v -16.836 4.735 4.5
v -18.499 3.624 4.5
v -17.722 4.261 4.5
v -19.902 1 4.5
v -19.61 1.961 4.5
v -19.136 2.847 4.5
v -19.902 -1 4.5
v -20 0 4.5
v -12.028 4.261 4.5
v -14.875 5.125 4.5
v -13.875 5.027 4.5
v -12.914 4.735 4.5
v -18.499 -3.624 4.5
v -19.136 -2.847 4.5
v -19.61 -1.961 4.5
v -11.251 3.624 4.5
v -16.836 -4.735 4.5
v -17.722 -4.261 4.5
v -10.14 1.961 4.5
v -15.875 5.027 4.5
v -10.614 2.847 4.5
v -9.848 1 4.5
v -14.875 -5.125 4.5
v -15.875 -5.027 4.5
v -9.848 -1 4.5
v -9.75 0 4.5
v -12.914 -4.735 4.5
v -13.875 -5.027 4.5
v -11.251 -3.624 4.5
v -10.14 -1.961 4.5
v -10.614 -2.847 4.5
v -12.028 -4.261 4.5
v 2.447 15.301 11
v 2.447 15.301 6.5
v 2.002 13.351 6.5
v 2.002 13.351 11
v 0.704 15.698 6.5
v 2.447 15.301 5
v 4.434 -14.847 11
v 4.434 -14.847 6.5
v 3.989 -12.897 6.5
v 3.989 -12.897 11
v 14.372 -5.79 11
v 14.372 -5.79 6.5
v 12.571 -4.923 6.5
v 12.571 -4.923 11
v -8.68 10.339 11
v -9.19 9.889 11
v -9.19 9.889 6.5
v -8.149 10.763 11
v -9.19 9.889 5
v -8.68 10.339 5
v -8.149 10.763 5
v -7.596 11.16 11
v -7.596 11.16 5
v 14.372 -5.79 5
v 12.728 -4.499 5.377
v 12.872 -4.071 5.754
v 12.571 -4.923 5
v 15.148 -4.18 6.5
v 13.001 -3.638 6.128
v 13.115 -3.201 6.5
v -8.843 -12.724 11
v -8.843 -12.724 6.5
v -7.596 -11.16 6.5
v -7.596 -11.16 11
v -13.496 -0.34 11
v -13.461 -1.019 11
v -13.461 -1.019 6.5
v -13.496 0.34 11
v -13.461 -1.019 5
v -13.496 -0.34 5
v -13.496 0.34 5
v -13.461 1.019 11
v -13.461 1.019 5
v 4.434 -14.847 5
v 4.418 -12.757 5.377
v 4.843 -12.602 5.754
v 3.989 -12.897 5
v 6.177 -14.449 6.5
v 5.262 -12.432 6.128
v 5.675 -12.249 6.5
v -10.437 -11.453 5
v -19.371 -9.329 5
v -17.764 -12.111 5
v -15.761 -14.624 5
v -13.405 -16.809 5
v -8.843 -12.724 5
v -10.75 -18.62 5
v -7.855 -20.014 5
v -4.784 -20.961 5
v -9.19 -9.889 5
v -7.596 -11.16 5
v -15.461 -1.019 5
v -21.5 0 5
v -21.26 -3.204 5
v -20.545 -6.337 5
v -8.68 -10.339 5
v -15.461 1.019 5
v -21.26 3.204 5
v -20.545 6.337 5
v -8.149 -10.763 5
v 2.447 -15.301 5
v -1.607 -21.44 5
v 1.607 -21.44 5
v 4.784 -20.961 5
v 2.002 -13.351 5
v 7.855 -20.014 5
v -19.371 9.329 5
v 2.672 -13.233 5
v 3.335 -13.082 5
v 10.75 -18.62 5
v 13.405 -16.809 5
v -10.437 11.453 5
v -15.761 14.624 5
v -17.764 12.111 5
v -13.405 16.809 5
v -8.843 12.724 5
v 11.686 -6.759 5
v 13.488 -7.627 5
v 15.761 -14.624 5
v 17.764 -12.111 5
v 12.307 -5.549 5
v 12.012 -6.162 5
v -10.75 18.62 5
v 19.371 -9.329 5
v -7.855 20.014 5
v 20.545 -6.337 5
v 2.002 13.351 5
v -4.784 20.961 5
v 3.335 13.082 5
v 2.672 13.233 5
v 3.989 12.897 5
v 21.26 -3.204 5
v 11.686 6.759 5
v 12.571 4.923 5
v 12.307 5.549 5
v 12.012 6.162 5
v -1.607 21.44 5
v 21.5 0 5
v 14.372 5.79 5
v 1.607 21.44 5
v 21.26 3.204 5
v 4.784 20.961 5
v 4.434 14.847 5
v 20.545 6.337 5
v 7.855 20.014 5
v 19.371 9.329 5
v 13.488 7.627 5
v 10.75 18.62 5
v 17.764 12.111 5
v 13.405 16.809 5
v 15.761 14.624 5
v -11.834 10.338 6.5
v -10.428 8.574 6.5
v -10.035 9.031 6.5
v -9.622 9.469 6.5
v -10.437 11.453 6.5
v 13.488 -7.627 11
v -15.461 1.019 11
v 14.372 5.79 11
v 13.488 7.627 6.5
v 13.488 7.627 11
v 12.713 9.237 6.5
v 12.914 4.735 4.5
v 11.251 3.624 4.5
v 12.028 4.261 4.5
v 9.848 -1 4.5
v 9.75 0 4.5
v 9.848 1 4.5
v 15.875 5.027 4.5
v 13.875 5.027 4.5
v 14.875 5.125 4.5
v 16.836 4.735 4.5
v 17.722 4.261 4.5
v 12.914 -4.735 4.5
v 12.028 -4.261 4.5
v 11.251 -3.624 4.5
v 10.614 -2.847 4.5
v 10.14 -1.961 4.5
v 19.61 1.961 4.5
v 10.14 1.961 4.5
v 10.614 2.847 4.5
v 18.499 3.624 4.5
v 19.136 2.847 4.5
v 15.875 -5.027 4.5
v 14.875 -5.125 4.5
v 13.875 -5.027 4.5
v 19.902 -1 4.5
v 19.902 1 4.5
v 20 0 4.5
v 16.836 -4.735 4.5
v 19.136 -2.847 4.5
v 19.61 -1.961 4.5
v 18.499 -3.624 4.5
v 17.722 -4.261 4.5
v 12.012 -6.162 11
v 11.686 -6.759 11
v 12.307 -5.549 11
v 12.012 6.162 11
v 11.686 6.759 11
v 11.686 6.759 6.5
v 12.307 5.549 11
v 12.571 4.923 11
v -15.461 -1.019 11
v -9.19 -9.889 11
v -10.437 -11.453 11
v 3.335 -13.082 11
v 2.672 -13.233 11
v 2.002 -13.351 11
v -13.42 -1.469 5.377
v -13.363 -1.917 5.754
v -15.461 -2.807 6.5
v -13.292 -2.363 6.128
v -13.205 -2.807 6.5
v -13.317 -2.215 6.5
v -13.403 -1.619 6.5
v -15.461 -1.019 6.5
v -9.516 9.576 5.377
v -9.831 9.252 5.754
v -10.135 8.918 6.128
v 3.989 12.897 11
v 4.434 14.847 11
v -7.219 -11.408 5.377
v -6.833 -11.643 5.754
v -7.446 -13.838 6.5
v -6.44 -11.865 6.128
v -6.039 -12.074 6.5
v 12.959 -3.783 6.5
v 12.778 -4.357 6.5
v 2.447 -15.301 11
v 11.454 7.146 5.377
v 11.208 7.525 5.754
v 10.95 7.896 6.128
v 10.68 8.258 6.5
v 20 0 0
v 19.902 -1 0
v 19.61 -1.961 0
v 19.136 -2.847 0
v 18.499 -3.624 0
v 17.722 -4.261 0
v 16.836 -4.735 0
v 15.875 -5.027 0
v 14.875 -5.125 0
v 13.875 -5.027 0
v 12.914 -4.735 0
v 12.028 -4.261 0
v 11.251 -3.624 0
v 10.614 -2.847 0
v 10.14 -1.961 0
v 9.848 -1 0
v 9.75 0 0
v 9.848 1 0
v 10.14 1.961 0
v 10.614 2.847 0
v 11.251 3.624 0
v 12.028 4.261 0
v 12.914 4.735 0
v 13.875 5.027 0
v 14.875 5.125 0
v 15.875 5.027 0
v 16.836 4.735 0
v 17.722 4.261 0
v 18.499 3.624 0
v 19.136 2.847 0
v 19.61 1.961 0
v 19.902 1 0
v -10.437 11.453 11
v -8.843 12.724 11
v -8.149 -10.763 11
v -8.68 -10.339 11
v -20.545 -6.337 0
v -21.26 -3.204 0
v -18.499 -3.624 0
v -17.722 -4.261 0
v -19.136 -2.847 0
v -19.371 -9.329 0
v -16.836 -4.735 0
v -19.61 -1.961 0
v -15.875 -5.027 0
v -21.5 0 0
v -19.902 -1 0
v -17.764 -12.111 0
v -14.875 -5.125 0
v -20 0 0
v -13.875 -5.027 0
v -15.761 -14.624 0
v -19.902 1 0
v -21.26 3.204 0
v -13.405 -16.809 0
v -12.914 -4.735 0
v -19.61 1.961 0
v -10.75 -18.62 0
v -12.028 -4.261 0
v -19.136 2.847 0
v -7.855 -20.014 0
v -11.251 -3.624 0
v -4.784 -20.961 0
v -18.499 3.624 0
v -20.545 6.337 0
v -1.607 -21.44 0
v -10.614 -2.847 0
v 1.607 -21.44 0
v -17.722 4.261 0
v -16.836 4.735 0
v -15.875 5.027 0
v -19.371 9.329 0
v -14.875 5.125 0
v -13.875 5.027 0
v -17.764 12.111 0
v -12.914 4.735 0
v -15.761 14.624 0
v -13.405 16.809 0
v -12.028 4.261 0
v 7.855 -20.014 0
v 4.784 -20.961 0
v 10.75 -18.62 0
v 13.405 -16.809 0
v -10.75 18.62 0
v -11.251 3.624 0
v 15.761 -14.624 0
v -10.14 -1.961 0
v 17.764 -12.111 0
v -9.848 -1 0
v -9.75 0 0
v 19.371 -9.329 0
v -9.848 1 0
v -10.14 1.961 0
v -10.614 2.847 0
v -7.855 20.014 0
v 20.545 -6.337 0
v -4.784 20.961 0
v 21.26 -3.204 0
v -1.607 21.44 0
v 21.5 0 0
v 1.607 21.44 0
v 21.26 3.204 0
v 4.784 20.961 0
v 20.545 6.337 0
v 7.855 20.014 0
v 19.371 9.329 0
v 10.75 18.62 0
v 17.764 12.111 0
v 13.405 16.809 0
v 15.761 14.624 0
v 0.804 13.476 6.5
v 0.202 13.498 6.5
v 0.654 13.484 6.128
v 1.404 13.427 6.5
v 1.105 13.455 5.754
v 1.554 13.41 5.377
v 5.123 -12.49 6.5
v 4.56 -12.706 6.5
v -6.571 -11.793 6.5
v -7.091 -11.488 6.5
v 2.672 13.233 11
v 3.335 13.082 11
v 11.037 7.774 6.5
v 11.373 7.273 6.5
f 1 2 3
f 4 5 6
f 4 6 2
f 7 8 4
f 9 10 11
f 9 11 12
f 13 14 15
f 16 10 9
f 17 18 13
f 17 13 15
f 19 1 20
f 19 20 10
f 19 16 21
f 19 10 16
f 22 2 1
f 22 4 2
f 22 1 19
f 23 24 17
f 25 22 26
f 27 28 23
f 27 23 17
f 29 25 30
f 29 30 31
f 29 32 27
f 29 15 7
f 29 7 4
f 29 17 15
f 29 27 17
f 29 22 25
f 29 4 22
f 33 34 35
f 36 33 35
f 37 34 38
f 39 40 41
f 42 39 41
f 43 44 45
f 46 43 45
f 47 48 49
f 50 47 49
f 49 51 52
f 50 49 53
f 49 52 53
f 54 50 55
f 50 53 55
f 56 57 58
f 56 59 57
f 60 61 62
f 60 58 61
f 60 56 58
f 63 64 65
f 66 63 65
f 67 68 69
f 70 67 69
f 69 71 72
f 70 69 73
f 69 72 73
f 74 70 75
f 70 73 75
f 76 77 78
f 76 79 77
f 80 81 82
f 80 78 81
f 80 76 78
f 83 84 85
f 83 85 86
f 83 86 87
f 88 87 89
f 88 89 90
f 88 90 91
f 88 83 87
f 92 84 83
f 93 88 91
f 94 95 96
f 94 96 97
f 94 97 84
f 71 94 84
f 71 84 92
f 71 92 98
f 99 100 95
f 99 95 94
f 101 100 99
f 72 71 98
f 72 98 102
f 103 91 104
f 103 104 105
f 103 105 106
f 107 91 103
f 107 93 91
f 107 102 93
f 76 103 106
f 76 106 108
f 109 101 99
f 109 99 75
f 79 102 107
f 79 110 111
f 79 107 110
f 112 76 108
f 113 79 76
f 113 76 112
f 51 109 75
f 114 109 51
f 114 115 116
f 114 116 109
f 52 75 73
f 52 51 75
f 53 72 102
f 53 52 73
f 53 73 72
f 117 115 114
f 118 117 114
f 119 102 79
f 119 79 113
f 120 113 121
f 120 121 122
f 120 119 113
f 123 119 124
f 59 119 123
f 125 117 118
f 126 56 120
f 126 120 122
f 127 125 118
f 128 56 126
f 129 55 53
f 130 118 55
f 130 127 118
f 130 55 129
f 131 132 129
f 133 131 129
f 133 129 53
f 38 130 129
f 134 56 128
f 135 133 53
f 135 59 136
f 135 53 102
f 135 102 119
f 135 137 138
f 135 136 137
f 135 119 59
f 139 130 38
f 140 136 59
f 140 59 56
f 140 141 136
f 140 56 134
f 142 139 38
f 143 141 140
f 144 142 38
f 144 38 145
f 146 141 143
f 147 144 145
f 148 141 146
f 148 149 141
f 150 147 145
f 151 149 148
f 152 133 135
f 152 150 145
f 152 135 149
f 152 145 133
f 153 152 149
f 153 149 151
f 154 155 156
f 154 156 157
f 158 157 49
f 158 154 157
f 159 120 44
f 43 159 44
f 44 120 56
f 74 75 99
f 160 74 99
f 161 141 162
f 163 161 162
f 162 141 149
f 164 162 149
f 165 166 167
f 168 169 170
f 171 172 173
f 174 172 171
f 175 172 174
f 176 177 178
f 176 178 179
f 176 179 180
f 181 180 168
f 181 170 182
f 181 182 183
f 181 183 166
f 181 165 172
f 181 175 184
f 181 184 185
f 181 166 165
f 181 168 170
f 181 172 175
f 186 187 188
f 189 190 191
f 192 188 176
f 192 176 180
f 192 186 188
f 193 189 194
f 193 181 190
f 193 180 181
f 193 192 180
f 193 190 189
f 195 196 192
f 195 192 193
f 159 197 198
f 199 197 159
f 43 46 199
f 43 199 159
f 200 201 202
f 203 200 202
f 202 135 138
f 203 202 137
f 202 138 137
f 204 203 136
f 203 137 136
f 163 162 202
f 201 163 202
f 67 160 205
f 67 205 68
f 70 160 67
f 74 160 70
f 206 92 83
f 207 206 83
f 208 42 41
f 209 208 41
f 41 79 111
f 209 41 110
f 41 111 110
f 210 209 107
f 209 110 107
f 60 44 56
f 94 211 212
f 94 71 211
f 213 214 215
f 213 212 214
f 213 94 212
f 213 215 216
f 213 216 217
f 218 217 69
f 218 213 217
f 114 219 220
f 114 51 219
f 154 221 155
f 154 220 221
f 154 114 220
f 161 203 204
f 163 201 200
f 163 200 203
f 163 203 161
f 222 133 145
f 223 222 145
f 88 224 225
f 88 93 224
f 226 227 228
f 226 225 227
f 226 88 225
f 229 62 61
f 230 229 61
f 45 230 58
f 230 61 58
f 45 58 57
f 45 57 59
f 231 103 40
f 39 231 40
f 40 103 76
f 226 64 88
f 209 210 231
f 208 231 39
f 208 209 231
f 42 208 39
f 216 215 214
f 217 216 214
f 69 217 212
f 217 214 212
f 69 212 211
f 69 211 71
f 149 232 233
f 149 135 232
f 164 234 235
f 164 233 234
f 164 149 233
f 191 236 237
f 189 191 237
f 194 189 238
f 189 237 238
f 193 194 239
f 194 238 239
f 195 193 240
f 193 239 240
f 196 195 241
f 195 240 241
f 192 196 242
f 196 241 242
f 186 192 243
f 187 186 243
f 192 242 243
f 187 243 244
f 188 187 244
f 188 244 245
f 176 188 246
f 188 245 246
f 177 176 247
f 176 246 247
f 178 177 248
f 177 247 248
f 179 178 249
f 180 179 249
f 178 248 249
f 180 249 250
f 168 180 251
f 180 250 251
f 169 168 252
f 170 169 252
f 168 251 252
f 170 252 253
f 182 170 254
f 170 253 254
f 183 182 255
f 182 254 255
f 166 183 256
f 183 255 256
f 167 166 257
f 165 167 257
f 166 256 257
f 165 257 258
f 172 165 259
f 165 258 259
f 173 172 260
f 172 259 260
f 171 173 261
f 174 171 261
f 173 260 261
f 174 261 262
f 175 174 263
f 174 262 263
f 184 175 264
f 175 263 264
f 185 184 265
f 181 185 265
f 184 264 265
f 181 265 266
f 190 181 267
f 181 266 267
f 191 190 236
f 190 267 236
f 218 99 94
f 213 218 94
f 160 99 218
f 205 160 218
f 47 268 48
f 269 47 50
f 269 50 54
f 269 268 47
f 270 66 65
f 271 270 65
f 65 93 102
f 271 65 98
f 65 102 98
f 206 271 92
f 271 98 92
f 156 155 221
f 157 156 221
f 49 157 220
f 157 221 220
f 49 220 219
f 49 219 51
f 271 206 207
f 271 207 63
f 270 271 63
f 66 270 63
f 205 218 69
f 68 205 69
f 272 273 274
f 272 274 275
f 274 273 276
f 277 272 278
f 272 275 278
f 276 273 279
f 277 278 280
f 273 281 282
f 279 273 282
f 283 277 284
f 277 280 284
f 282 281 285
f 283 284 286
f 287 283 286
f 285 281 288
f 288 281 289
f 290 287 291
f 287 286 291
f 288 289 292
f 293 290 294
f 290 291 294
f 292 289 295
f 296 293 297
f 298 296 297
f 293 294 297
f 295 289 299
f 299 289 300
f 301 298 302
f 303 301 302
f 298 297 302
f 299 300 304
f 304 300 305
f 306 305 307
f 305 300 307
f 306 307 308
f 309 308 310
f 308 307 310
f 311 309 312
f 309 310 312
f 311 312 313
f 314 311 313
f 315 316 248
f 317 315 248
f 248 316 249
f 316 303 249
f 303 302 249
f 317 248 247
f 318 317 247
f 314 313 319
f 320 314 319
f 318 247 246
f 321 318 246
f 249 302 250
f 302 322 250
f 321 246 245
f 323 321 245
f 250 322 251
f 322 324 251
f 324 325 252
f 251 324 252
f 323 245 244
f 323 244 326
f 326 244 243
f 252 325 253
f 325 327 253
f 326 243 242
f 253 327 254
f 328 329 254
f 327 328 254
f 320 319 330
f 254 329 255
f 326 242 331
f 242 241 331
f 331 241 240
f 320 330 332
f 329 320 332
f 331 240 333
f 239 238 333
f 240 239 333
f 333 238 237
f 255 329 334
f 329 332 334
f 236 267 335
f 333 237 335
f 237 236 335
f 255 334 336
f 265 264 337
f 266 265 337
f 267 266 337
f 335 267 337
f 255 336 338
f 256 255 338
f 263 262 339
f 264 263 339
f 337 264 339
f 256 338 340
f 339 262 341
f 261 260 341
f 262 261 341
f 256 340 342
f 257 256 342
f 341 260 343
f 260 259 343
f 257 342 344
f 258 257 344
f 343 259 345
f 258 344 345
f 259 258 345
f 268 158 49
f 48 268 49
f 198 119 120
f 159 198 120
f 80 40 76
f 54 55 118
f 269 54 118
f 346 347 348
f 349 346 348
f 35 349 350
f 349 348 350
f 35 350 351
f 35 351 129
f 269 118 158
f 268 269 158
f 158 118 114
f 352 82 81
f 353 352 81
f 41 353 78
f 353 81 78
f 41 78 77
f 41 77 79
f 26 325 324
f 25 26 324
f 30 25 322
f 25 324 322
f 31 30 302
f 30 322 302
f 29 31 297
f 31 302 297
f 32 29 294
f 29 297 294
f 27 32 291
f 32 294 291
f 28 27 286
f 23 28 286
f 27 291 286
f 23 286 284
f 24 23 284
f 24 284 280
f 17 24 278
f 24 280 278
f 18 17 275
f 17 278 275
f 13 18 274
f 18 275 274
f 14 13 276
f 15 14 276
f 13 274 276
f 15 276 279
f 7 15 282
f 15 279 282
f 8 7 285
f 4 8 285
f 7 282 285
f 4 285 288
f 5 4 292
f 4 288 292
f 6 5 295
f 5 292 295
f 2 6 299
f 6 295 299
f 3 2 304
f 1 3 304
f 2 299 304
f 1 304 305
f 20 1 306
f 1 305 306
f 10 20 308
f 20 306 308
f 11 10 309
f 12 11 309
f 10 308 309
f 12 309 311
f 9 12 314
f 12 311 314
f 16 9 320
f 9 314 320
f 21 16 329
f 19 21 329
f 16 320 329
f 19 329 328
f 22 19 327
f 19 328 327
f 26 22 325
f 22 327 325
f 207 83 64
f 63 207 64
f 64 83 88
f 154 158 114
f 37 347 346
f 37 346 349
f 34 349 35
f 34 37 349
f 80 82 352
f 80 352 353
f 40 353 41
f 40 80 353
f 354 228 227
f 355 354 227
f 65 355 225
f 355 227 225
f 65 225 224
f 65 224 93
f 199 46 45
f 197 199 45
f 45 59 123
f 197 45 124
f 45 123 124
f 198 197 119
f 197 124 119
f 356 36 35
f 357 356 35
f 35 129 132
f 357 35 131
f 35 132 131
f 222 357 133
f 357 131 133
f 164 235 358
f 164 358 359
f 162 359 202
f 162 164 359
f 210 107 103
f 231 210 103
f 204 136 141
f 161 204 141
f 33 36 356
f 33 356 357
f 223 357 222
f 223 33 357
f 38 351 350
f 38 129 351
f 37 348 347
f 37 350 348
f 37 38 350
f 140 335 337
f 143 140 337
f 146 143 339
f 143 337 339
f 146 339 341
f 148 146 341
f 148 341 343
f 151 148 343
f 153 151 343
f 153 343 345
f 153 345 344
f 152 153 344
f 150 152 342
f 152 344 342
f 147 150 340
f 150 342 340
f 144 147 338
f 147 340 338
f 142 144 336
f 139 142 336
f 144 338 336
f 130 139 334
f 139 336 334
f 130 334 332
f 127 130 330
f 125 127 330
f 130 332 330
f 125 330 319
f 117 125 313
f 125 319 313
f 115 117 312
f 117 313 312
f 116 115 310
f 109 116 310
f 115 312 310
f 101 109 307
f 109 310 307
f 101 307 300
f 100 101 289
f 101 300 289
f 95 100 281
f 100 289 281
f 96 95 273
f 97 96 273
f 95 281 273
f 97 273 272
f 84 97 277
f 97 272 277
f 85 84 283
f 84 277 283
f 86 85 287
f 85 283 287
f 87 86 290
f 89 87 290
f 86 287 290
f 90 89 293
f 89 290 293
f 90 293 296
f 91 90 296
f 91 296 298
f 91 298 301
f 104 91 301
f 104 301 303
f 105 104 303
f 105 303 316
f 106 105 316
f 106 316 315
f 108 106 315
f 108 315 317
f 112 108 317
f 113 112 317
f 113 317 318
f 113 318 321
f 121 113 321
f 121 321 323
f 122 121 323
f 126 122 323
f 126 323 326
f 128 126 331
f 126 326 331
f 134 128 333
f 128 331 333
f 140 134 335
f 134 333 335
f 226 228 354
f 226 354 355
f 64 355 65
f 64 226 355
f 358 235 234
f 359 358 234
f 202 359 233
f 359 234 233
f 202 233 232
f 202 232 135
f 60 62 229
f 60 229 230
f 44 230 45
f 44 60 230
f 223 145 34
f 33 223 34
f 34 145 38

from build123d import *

# Parameters (mm, degrees)
F0_R            = 21.5
F0_R_2          = 13.5
F1_DEPTH        = 5
F3_DEPTH        = 6
F4_R            = 5.125
F5_DEPTH        = 4.5
F7_END_RADIUS   = 13.5
F7_REACH        = 39.2960714607
F7_COPIES_COUNT = 7


# Not quite as in the source:
# - a pattern or mirror of a feature is missing from the dataset's text; its kind, count and spacing are read off the source's solid


with BuildPart() as f1:
    # F0 (on Top) → F1 (new body)
    with BuildSketch(Plane.XY):
        Circle(F0_R)
        Circle(F0_R_2, mode=Mode.SUBTRACT)
        Circle(F0_R_2)
    extrude(amount=F1_DEPTH)

    # F2 (on face) → F3 (join)
    with BuildSketch(Plane.XY.offset(5)):
        with BuildLine():
            ThreePointArc((-13.4614857204, -1.0190202158), (-13.5, 0), (-13.4614857204, 1.0190202158))
            Line((-13.4614857204, 1.0190202158), (-15.4614857204, 1.0190202158))
            Line((-15.4614857204, 1.0190202158), (-15.4614857204, -1.0190202158))
            Line((-15.4614857204, -1.0190202158), (-13.4614857204, -1.0190202158))
        make_face()
        with BuildLine():
            ThreePointArc((-7.5963969786, -11.1599620494), (-8.4171123251, -10.5547250133), (-9.1898011505, -9.8892646246))
            Line((-9.1898011505, -9.8892646246), (-10.4367807542, -11.4529275895))
            Line((-10.4367807542, -11.4529275895), (-8.8433765823, -12.7236250143))
            Line((-8.8433765823, -12.7236250143), (-7.5963969786, -11.1599620494))
        make_face()
        with BuildLine():
            ThreePointArc((3.9889336264, -12.8972248381), (3.0040326084, -13.1615268145), (2.0019911235, -13.3507314984))
            Line((2.0019911235, -13.3507314984), (2.4470329914, -15.3005873227))
            Line((2.4470329914, -15.3005873227), (4.4339754943, -14.8470806625))
            Line((4.4339754943, -14.8470806625), (3.9889336264, -12.8972248381))
        make_face()
        with BuildLine():
            ThreePointArc((12.5705158512, -4.9226142683), (12.1630797167, -5.8574304781), (11.6862432483, -6.7588252486))
            Line((11.6862432483, -6.7588252486), (13.4881809841, -7.6265927268))
            Line((13.4881809841, -7.6265927268), (14.372453587, -5.7903817465))
            Line((14.372453587, -5.7903817465), (12.5705158512, -4.9226142683))
        make_face()
        with BuildLine():
            ThreePointArc((11.6862432483, 6.7588252486), (12.1630797167, 5.8574304781), (12.5705158512, 4.9226142683))
            Line((12.5705158512, 4.9226142683), (14.372453587, 5.7903817465))
            Line((14.372453587, 5.7903817465), (13.4881809841, 7.6265927268))
            Line((13.4881809841, 7.6265927268), (11.6862432483, 6.7588252486))
        make_face()
        with BuildLine():
            ThreePointArc((2.0019911235, 13.3507314984), (3.0040326084, 13.1615268145), (3.9889336264, 12.8972248381))
            Line((3.9889336264, 12.8972248381), (4.4339754943, 14.8470806625))
            Line((4.4339754943, 14.8470806625), (2.4470329914, 15.3005873227))
            Line((2.4470329914, 15.3005873227), (2.0019911235, 13.3507314984))
        make_face()
        with BuildLine():
            ThreePointArc((-9.1898011505, 9.8892646246), (-8.4171123251, 10.5547250133), (-7.5963969786, 11.1599620494))
            Line((-7.5963969786, 11.1599620494), (-8.8433765823, 12.7236250143))
            Line((-8.8433765823, 12.7236250143), (-10.4367807542, 11.4529275895))
            Line((-10.4367807542, 11.4529275895), (-9.1898011505, 9.8892646246))
        make_face()
    extrude(amount=F3_DEPTH)

    # F4 (on face) → F5 (cut)
    with BuildSketch(Plane(origin=(0, 0, 0), x_dir=(1, 0, 0), z_dir=(0, 0, -1))):
        with Locations((-14.875, 0)):
            Circle(F4_R)
        with Locations((14.875, 0)):
            Circle(F4_R)
    extrude(amount=-F5_DEPTH, mode=Mode.SUBTRACT)

    f7_end = (Plane(origin=(0, 0, 8), x_dir=(-1, 0, 0), z_dir=(0, 0, -1)) * Cylinder(F7_END_RADIUS, 202.1882593652, mode=Mode.PRIVATE)).faces().sort_by_distance((-13.5, 0, 8))[0]
    # F6 (on face) → F7 (join, up to the whole of a round face its end follows)
    with BuildSketch(Plane(origin=(-15.4614857204, 0, 0), x_dir=(0, -1, 0), z_dir=(-1, 0, 0))):
        Polygon((1.0190202158, 6.5), (1.0190202158, 5), (2.8066506047, 6.5), align=None)
    f7_long = extrude(amount=-F7_REACH, mode=Mode.PRIVATE)
    f7 = split(f7_long, bisect_by=f7_end, keep=Keep.ALL, mode=Mode.PRIVATE).solids().sort_by_distance((-15.4614857204, -1.6148970121, 6))[0]
    add(f7)

    # F7_copies: F7 ×7 about axis
    f7_copies_axis = Axis((0, 0, 0), (0, 0, 1))
    for i in range(1, F7_COPIES_COUNT):
        add(f7.rotate(f7_copies_axis, i * 360 / F7_COPIES_COUNT))


solid = f1.part
